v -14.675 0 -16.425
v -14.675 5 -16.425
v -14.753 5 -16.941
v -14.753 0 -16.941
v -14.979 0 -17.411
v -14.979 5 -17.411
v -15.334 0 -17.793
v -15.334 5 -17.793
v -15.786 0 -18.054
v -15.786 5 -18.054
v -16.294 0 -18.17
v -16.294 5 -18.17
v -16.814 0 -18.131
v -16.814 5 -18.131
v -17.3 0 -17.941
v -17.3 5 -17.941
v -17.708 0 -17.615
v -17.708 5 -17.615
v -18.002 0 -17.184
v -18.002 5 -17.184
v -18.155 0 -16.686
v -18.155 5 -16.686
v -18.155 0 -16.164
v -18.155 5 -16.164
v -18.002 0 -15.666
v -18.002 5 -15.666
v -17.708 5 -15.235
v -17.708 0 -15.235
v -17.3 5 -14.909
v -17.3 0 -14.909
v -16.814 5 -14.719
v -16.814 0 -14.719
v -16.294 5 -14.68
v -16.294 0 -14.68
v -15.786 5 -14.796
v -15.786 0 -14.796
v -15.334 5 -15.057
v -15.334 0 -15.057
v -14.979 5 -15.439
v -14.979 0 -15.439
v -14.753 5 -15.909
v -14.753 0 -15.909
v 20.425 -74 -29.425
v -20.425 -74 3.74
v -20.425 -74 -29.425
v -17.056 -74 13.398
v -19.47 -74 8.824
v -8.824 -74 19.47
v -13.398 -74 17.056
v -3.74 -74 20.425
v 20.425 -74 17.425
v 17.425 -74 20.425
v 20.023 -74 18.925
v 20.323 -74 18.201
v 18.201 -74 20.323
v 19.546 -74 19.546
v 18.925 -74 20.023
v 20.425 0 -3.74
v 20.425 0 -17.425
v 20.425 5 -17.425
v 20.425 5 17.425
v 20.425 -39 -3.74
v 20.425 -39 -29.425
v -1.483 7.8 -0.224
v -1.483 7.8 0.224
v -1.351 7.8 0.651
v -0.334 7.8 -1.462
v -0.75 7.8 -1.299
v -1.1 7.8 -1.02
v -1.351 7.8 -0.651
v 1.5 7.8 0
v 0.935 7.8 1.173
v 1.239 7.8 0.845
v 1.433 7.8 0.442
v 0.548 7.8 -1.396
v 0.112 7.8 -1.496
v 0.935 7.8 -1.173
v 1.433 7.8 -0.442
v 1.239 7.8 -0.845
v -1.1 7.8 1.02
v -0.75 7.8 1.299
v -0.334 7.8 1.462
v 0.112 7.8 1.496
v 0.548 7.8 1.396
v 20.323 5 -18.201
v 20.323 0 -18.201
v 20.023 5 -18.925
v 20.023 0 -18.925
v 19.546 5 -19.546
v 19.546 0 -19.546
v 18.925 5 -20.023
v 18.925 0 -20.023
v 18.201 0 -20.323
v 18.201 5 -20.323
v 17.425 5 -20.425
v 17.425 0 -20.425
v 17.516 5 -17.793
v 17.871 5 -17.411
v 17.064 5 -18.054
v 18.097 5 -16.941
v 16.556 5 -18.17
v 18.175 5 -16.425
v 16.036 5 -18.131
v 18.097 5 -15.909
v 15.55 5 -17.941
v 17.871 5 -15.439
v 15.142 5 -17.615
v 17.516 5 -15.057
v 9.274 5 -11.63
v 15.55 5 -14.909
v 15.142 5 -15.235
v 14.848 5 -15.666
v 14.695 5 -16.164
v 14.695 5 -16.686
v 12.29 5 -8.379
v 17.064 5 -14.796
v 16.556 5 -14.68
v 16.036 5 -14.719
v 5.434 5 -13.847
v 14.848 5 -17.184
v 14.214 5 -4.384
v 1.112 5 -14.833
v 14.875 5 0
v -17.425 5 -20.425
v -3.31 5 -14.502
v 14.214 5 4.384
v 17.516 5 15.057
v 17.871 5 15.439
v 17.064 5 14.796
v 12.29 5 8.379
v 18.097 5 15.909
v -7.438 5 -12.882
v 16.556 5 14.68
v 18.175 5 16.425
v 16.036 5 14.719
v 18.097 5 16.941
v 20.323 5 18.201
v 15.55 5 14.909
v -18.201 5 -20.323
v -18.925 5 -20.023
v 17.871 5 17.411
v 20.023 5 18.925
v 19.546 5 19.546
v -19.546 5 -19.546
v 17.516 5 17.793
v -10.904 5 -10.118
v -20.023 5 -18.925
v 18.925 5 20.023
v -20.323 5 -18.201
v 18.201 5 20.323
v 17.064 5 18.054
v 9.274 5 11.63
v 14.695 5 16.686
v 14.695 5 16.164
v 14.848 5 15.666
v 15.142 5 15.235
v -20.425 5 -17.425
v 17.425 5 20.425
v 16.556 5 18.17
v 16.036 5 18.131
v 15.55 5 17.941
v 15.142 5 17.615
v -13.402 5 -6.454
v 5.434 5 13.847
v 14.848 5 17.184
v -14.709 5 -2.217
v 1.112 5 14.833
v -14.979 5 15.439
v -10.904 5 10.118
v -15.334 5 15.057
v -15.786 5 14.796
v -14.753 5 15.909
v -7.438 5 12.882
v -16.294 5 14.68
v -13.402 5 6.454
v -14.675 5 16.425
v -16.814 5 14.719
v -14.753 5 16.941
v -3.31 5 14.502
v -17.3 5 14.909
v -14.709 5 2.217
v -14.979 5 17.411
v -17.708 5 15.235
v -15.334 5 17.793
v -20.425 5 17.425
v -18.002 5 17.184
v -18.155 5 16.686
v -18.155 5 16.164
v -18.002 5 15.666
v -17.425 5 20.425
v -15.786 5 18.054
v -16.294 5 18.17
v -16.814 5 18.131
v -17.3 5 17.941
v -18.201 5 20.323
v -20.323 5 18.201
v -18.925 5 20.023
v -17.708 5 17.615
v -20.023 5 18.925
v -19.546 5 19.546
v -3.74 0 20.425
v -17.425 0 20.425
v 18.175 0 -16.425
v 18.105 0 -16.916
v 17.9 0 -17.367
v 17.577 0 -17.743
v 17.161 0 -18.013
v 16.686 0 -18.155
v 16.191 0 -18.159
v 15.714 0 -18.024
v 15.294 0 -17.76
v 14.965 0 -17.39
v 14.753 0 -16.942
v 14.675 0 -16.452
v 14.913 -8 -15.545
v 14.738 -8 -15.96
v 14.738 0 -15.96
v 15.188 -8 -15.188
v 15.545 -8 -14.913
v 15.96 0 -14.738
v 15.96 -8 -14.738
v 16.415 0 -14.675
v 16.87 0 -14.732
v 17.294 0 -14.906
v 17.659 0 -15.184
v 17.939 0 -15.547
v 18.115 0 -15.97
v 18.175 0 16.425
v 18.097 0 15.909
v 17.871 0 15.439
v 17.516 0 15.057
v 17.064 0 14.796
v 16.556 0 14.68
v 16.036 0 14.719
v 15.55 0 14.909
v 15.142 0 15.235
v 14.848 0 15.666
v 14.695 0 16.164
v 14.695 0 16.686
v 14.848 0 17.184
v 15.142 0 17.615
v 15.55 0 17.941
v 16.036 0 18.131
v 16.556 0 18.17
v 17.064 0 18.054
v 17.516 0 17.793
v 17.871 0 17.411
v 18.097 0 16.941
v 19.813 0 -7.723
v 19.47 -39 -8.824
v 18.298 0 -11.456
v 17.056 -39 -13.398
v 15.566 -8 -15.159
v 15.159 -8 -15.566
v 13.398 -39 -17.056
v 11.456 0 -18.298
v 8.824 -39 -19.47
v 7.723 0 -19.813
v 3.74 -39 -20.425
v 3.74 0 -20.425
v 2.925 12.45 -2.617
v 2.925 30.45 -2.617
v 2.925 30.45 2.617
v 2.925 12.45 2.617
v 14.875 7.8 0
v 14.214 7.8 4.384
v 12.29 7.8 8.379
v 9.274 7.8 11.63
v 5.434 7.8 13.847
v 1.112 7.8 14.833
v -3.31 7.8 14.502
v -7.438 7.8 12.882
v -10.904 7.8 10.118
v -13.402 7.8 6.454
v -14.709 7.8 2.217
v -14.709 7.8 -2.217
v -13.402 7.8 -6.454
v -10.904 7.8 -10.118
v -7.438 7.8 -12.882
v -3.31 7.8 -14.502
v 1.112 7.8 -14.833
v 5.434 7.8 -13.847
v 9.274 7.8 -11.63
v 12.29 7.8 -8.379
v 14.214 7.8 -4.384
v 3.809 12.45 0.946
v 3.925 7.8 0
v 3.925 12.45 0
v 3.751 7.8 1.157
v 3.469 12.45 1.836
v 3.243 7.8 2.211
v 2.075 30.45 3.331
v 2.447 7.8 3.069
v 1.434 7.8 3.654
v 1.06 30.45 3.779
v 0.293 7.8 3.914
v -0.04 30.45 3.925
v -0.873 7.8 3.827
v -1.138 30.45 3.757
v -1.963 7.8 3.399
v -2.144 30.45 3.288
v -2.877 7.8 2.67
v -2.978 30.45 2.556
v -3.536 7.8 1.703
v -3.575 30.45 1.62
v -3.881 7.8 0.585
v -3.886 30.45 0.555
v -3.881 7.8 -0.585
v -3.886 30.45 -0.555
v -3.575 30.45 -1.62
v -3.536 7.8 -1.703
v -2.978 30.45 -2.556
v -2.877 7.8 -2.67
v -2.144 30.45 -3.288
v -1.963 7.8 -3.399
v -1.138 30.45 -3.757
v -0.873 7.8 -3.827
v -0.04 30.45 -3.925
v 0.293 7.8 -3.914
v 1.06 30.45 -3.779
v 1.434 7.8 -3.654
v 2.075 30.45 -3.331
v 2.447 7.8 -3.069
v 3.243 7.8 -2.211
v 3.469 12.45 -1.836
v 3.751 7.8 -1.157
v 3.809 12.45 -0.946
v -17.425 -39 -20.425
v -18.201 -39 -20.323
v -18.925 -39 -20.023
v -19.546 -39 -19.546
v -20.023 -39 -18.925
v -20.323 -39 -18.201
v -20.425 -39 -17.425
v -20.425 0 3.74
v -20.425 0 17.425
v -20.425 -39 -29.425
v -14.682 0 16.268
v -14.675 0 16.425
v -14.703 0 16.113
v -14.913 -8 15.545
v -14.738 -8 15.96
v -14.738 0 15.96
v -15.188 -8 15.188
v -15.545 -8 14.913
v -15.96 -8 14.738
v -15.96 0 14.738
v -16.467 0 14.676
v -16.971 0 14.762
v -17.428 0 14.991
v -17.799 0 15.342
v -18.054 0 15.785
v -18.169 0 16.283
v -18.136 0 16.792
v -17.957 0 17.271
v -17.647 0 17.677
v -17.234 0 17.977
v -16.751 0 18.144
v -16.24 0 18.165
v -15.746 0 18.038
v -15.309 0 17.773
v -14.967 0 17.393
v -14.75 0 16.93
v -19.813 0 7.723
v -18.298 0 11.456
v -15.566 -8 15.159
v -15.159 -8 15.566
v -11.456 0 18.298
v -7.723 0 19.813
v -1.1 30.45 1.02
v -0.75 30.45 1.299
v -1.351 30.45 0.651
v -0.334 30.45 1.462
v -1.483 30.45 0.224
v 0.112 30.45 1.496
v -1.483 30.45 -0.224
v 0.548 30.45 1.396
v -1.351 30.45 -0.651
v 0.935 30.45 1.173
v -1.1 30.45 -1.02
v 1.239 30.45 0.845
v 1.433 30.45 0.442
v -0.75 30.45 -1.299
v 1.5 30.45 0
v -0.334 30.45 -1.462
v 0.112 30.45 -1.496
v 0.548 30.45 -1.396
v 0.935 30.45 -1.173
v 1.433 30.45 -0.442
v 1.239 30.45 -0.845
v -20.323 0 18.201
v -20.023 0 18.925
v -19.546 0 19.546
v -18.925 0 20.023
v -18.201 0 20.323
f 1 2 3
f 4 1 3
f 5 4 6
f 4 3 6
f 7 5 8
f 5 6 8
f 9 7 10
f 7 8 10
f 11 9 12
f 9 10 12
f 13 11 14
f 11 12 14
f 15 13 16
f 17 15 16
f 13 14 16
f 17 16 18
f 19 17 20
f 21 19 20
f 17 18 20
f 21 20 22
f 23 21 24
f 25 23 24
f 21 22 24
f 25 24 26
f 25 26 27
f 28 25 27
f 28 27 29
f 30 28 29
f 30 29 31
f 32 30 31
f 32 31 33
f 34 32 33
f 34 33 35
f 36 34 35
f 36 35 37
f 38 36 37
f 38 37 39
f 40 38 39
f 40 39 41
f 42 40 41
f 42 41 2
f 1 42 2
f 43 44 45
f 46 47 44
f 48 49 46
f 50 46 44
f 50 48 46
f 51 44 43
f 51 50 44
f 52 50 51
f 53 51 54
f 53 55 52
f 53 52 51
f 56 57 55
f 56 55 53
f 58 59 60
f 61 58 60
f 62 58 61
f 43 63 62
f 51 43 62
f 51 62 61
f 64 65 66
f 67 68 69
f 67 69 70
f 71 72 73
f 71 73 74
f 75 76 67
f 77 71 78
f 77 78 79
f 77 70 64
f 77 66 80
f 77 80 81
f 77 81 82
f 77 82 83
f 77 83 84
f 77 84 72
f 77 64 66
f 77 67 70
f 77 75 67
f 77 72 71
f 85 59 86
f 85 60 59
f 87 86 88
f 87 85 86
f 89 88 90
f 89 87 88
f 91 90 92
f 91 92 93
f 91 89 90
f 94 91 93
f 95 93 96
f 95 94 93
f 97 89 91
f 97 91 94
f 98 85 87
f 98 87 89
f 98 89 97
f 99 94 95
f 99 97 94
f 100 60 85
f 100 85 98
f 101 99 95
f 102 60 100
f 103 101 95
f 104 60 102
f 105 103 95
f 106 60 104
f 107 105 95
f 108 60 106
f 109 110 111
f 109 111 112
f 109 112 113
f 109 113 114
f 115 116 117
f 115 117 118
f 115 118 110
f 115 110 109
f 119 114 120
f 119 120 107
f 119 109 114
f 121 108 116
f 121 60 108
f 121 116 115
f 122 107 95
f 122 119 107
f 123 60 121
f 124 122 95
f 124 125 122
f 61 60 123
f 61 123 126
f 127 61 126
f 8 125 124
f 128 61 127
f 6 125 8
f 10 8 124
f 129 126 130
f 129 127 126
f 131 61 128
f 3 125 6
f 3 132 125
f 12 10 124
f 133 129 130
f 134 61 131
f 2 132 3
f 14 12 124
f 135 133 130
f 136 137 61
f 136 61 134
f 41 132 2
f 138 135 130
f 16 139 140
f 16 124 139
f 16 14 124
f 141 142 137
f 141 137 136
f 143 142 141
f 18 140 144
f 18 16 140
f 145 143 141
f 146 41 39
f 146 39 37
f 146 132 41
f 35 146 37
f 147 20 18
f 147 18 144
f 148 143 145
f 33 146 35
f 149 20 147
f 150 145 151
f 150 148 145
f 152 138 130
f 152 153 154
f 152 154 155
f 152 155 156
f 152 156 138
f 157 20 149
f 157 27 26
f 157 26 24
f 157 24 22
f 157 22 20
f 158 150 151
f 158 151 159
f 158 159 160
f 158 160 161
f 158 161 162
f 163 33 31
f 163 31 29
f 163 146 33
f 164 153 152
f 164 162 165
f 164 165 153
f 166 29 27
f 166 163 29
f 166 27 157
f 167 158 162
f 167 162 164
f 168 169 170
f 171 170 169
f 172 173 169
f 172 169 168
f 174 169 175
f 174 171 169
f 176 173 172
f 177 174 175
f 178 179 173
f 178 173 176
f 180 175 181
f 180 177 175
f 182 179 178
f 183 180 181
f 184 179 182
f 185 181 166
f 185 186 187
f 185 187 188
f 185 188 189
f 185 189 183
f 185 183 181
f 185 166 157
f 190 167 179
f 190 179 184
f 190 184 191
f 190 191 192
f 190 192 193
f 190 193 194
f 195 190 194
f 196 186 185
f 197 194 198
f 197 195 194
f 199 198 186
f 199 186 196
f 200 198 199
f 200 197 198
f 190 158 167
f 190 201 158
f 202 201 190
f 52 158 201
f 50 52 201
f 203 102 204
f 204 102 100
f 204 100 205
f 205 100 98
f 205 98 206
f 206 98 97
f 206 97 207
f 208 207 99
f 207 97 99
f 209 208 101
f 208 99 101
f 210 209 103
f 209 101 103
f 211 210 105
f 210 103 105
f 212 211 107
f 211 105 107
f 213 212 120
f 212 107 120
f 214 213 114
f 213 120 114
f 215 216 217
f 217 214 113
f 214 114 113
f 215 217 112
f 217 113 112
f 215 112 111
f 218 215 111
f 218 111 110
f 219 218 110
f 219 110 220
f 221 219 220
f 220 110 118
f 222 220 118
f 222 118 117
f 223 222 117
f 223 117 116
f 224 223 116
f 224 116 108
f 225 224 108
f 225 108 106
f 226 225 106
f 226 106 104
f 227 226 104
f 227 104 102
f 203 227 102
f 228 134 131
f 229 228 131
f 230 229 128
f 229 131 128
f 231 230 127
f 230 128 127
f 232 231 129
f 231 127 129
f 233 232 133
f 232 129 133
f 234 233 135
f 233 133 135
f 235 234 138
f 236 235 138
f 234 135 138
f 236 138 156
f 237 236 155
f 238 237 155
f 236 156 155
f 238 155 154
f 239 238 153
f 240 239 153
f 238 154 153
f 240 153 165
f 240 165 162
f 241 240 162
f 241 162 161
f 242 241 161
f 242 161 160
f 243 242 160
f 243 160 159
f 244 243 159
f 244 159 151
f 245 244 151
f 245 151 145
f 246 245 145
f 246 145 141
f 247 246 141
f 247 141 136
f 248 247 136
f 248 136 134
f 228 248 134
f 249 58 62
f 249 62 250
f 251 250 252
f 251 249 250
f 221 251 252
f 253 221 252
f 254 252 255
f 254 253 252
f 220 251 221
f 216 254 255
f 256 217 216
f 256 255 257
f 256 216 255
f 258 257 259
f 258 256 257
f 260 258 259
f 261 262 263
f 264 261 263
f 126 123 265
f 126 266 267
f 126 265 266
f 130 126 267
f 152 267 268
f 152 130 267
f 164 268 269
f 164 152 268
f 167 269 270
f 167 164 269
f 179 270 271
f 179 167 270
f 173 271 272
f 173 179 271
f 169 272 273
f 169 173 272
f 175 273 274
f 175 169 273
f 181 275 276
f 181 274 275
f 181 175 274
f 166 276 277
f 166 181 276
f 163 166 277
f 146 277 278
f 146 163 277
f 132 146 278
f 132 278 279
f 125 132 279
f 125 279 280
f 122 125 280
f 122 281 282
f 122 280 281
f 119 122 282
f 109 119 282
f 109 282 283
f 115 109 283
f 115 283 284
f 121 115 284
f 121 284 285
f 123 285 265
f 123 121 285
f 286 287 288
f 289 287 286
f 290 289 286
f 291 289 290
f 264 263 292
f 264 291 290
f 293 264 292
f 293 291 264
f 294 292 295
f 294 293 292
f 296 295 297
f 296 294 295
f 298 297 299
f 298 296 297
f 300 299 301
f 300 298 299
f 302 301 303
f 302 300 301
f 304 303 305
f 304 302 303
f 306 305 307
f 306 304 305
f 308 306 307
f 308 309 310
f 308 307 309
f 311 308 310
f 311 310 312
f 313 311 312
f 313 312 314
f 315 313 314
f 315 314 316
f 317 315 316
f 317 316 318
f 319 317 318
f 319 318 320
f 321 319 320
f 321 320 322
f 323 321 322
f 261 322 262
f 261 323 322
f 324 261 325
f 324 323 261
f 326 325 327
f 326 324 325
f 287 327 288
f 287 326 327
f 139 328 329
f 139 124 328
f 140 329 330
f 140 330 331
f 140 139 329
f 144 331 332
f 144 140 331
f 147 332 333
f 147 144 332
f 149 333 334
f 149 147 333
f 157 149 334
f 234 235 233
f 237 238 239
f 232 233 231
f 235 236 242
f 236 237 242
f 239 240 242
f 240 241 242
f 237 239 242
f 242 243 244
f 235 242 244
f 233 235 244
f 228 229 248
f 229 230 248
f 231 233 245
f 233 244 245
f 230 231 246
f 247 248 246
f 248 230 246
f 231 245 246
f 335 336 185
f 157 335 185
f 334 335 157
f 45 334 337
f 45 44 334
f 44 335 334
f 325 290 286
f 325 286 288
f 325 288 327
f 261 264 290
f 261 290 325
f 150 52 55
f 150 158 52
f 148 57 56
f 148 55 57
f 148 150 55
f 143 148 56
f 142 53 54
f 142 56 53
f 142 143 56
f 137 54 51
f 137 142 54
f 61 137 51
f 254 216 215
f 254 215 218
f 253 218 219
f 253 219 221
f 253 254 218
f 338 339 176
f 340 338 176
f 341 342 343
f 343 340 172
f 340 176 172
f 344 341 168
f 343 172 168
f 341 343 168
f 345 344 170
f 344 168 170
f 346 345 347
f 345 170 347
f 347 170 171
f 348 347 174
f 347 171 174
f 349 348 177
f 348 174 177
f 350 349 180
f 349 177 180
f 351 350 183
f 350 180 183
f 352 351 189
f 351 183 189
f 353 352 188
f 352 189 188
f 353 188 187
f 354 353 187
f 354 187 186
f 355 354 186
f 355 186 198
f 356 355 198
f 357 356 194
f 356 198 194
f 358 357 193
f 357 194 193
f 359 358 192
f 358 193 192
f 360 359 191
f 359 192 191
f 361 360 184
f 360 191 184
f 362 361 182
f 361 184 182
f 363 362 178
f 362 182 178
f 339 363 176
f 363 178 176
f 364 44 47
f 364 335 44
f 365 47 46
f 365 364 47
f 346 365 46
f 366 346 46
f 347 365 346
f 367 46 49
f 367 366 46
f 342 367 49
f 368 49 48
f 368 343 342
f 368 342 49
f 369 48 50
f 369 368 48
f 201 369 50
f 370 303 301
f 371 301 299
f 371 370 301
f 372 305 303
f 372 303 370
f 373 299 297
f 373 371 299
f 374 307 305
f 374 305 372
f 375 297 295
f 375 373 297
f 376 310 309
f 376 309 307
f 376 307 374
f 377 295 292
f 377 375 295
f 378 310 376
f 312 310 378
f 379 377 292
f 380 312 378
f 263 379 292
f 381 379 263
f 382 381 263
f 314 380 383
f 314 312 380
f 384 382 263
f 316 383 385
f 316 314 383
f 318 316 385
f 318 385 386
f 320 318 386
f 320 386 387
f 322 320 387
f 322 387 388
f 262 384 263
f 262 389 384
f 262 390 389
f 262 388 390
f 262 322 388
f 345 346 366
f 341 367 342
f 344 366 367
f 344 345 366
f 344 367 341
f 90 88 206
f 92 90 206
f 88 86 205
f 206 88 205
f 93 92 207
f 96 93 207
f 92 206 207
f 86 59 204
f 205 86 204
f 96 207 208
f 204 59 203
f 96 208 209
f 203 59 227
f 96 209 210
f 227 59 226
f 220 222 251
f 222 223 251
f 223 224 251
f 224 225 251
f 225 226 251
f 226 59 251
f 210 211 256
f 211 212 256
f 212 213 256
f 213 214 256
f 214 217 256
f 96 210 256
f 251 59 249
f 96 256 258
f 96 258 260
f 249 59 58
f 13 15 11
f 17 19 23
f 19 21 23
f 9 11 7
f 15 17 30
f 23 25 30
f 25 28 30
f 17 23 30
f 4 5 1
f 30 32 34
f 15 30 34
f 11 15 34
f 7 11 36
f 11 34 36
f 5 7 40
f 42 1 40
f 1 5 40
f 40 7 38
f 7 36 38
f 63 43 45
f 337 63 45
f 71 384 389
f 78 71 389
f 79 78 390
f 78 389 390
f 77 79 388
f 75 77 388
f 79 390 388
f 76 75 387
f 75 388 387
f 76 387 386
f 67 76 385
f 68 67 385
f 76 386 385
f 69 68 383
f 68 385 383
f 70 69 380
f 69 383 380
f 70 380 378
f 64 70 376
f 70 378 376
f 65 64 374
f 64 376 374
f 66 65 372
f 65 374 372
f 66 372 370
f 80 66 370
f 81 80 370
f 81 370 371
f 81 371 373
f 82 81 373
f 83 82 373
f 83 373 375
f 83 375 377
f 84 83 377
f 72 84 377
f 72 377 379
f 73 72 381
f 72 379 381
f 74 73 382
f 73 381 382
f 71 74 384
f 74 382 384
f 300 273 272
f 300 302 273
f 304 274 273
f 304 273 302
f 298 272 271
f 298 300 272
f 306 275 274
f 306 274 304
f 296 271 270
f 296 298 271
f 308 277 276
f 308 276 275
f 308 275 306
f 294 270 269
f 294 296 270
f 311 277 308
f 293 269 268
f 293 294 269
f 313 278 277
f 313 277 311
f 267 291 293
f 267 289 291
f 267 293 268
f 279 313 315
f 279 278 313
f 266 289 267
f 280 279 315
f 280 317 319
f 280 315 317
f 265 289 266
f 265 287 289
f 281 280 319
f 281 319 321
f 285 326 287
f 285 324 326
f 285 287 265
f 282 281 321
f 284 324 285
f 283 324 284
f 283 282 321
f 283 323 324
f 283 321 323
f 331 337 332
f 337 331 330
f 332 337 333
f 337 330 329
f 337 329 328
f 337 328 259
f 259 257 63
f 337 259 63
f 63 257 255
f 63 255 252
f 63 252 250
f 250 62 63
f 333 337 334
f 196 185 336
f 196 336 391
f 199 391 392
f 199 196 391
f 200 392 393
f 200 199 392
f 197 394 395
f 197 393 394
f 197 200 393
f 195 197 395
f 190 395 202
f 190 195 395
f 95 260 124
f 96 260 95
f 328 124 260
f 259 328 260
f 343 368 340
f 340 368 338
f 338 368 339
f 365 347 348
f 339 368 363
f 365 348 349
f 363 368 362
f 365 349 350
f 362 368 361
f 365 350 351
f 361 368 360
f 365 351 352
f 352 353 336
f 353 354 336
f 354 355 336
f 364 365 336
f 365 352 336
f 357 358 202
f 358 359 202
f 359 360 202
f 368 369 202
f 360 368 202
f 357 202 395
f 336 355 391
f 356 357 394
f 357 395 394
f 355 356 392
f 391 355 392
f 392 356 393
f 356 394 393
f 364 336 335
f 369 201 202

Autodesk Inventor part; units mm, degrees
ref_plane "YZ Plane" through (0, 0, 0) normal (1, 0, 0) x (0, 1, 0)
ref_plane "XZ Plane" through (0, 0, 0) normal (0, 1, 0) x (-1, 0, 0)
ref_plane "XY Plane" through (0, 0, 0) normal (0, 0, 1) x (1, 0, 0)
sketch "Sketch1" plane through (0, 0, 0) normal (0, 1, 0) x (-1, 0, 0)
  line L0 (-20.425, 20.425) -> (20.425, 20.425)
  line L1 (20.425, 20.425) -> (20.425, -20.425)
  line L2 (20.425, -20.425) -> (-20.425, -20.425)
  line L3 (-20.425, -20.425) -> (-20.425, 20.425)
  line L4 (-20.425, 20.425) -> (20.425, -20.425) construction
  line L5 (20.425, 20.425) -> (-20.425, -20.425) construction
  point P0 (0, 0)
  dimension "d0" = 40.85
  dimension "d1" = 40.85
extrude "Extrusion1" add sketch "Sketch1" along normal blind 5
sketch "Sketch2" plane through (0, 5, 0) normal (0, 1, 0) x (1, 0, 0)
  line L0 (-20.425, 20.425) -> (-20.425, -20.425) projected
  line L1 (-20.425, -20.425) -> (-16.425, -20.425)
  line L2 (-16.425, -20.425) -> (-16.425, -16.425)
  line L3 (-16.425, -16.425) -> (-20.425, -16.425)
  line L4 (-20.425, -16.425) -> (-20.425, -20.425)
  line L5 (-20.425, 20.425) -> (-16.425, 20.425)
  line L6 (-16.425, 20.425) -> (-16.425, 16.425)
  line L7 (-16.425, 16.425) -> (-20.425, 16.425)
  line L8 (-20.425, 16.425) -> (-20.425, 20.425)
  line L9 (-20.425, -20.425) -> (20.425, -20.425) projected
  line L10 (20.425, -20.425) -> (16.425, -20.425)
  line L11 (16.425, -20.425) -> (16.425, -16.425)
  line L12 (16.425, -16.425) -> (20.425, -16.425)
  line L13 (20.425, -16.425) -> (20.425, -20.425)
  line L14 (20.425, 20.425) -> (16.425, 20.425)
  line L15 (16.425, 20.425) -> (16.425, 16.425)
  line L16 (16.425, 16.425) -> (20.425, 16.425)
  line L17 (20.425, 16.425) -> (20.425, 20.425)
  circle A0 centre (-16.425, -16.425) radius 1.75
  circle A1 centre (-16.425, 16.425) radius 1.75
  circle A2 centre (16.425, -16.425) radius 1.75
  circle A3 centre (16.425, 16.425) radius 1.75
  point P0 (0, 0)
  dimension "d4" = 4
  dimension "d5" = 4
  dimension "d6" = 4
  dimension "d7" = 4
  dimension "d8" = 4
  dimension "d9" = 4
  dimension "d10" = 4
  dimension "d11" = 4
  dimension "d12" = 3.5
  dimension "d13" = 3.5
  dimension "d14" = 3.5
  dimension "d15" = 3.5
extrude "Extrusion2" cut sketch "Sketch2" against normal blind 5 contours A1 L6 L7 | L7 L6 A1 | A0 L2 L3 | L3 L2 A0 | A2 L12 L11 | L11 L12 A2 | A3 L16 L15 | L15 L16 A3
fillet "Fillet1" radius 3 4 edges at (-20.425, 2.5, 20.425) (20.425, 2.5, 20.425) (20.425, 2.5, -20.425) (-20.425, 2.5, -20.425)
sketch "Sketch3" plane through (0, 5, 0) normal (0, 1, 0) x (1, 0, 0)
  circle A0 centre (0, 0) radius 14.875
  dimension "d19" = 29.75
extrude "Extrusion3" add sketch "Sketch3" along normal blind 2.8
sketch "Sketch4" plane through (0, 7.8, 0) normal (0, 1, 0) x (1, 0, 0)
  circle A0 centre (0, 0) radius 3.925
  dimension "d22" = 7.85
extrude "Extrusion4" add sketch "Sketch4" along normal blind 22.65
sketch "Sketch5" plane through (0, 30.45, 0) normal (0, 1, 0) x (1, 0, 0)
  circle A0 centre (0, 0) radius 3.925 projected
  circle A1 centre (0, 0) radius 1.5
  dimension "d25" = 3
extrude "Extrusion5" cut sketch "Sketch5" against normal blind 22.65 contours A1
sketch "Sketch6" plane through (0, 0, 0) normal (0, -1, 0) x (1, 0, 0)
  arc A0 (-20.425, -17.425) -> (-17.425, -20.425) centre (-17.425, -17.425) ccw
  line L0 (17.425, -20.425) -> (-17.425, -20.425)
  arc A1 (17.425, -20.425) -> (20.425, -17.425) centre (17.425, -17.425) ccw
  line L1 (20.425, 17.425) -> (20.425, -17.425)
  arc A2 (20.425, 17.425) -> (17.425, 20.425) centre (17.425, 17.425) ccw
  line L2 (-17.425, 20.425) -> (17.425, 20.425)
  arc A3 (-17.425, 20.425) -> (-20.425, 17.425) centre (-17.425, 17.425) ccw
  line L3 (-20.425, -17.425) -> (-20.425, 17.425)
  line L4 (17.425, -20.425) -> (20.425, -20.425)
  arc A4 (17.425, -20.425) -> (20.425, -17.425) centre (17.425, -17.425) ccw
  line L5 (20.425, -20.425) -> (20.425, -17.425)
  circle A5 centre (16.425, -16.425) radius 1.75
  line L6 (16.425, -16.425) -> (0, 0)
  line L7 (16.425, -16.425) -> (15.3643, -15.3643)
  line L8 (20.425, 0) -> (20.425, -2.5)
  line L9 (20.425, 17.425) -> (20.425, -17.425)
  line L10 (0, -20.425) -> (2.5, -20.425)
  arc A6 (2.5, -20.425) -> (20.425, -2.5) centre (3.12, -3.12) ccw
  arc A7 (-2.5, 20.425) -> (-20.425, 2.5) centre (-3.12, 3.12) ccw
  point P0 (3.74, -20.425)
  point P1 (20.425, -3.74)
  point P2 (-3.74, 20.425)
  point P3 (-20.425, 3.74)
  dimension "d30" = 1.5
  dimension "d31" = 2.5
  dimension "d32" = 2.5
extrude "Extrusion6" add sketch "Sketch6" along normal blind 74 contours L3 A7 L2 A2 L1 A6 A5 L0 A0 | A5 L6 A6 | A5 A6 L6
sketch "Sketch7" plane through (0, -74, 0) normal (0, -1, 0) x (1, 0, 0)
  line L0 (-17.425, -20.425) -> (3.74, -20.425)
  arc A0 (3.74, -20.425) -> (20.425, -3.74) centre (3.12, -3.12) ccw
  line L1 (20.425, -3.74) -> (20.425, 17.425)
  arc A1 (20.425, 17.425) -> (17.425, 20.425) centre (17.425, 17.425) ccw
  line L2 (17.425, 20.425) -> (-3.74, 20.425)
  arc A2 (-3.74, 20.425) -> (-20.425, 3.74) centre (-3.12, 3.12) ccw
  line L3 (-20.425, 3.74) -> (-20.425, -17.425)
  arc A3 (-20.425, -17.425) -> (-17.425, -20.425) centre (-17.425, -17.425) ccw
  arc A4 (3.74, -20.425) -> (20.425, -3.74) centre (3.12, -3.12) ccw projected
  line L4 (20.425, -3.74) -> (20.425, -20.425)
  line L5 (-17.425, -20.425) -> (3.74, -20.425) projected
  line L6 (20.425, -20.425) -> (3.74, -20.425)
  line L7 (20.425, -20.425) -> (20.425, -29.425)
  line L8 (20.425, -29.425) -> (-20.425, -29.425)
  line L9 (-20.425, -29.425) -> (-20.425, -17.425)
  point P0 (0, 0)
  dimension "d33" = 9
extrude "Extrusion7" add sketch "Sketch7" against normal blind 35
sketch "Sketch8" plane through (0, 5, 0) normal (0, 1, 0) x (1, 0, 0)
  circle A0 centre (-16.425, -16.425) radius 1.75 projected
  circle A1 centre (-16.425, 16.425) radius 1.75 projected
  circle A2 centre (16.425, -16.425) radius 1.75 projected
  circle A3 centre (16.425, 16.425) radius 1.75 projected
  point P0 (0, 0)
extrude "Extrusion8" cut sketch "Sketch8" against normal blind 13 contours A0 | A3
sketch "Sketch9" plane through (0, 30.45, 0) normal (0, 1, 0) x (1, 0, 0)
  circle A0 centre (0, 0) radius 1.5 projected
  circle A1 centre (0, 0) radius 3.925
  line L0 (3.925, 0) -> (2.925, 0)
  line L1 (2.925, 0) -> (2.925, 2.6173)
  circle A2 centre (0, 0) radius 3.925 projected
  line L2 (2.925, 0) -> (2.925, -2.6173)
  dimension "d38" = 1
extrude "Extrusion9" cut sketch "Sketch9" against normal blind 18 contours L0 L1 A1 | A1 L2 L0
properties part number "ServoMotor"
